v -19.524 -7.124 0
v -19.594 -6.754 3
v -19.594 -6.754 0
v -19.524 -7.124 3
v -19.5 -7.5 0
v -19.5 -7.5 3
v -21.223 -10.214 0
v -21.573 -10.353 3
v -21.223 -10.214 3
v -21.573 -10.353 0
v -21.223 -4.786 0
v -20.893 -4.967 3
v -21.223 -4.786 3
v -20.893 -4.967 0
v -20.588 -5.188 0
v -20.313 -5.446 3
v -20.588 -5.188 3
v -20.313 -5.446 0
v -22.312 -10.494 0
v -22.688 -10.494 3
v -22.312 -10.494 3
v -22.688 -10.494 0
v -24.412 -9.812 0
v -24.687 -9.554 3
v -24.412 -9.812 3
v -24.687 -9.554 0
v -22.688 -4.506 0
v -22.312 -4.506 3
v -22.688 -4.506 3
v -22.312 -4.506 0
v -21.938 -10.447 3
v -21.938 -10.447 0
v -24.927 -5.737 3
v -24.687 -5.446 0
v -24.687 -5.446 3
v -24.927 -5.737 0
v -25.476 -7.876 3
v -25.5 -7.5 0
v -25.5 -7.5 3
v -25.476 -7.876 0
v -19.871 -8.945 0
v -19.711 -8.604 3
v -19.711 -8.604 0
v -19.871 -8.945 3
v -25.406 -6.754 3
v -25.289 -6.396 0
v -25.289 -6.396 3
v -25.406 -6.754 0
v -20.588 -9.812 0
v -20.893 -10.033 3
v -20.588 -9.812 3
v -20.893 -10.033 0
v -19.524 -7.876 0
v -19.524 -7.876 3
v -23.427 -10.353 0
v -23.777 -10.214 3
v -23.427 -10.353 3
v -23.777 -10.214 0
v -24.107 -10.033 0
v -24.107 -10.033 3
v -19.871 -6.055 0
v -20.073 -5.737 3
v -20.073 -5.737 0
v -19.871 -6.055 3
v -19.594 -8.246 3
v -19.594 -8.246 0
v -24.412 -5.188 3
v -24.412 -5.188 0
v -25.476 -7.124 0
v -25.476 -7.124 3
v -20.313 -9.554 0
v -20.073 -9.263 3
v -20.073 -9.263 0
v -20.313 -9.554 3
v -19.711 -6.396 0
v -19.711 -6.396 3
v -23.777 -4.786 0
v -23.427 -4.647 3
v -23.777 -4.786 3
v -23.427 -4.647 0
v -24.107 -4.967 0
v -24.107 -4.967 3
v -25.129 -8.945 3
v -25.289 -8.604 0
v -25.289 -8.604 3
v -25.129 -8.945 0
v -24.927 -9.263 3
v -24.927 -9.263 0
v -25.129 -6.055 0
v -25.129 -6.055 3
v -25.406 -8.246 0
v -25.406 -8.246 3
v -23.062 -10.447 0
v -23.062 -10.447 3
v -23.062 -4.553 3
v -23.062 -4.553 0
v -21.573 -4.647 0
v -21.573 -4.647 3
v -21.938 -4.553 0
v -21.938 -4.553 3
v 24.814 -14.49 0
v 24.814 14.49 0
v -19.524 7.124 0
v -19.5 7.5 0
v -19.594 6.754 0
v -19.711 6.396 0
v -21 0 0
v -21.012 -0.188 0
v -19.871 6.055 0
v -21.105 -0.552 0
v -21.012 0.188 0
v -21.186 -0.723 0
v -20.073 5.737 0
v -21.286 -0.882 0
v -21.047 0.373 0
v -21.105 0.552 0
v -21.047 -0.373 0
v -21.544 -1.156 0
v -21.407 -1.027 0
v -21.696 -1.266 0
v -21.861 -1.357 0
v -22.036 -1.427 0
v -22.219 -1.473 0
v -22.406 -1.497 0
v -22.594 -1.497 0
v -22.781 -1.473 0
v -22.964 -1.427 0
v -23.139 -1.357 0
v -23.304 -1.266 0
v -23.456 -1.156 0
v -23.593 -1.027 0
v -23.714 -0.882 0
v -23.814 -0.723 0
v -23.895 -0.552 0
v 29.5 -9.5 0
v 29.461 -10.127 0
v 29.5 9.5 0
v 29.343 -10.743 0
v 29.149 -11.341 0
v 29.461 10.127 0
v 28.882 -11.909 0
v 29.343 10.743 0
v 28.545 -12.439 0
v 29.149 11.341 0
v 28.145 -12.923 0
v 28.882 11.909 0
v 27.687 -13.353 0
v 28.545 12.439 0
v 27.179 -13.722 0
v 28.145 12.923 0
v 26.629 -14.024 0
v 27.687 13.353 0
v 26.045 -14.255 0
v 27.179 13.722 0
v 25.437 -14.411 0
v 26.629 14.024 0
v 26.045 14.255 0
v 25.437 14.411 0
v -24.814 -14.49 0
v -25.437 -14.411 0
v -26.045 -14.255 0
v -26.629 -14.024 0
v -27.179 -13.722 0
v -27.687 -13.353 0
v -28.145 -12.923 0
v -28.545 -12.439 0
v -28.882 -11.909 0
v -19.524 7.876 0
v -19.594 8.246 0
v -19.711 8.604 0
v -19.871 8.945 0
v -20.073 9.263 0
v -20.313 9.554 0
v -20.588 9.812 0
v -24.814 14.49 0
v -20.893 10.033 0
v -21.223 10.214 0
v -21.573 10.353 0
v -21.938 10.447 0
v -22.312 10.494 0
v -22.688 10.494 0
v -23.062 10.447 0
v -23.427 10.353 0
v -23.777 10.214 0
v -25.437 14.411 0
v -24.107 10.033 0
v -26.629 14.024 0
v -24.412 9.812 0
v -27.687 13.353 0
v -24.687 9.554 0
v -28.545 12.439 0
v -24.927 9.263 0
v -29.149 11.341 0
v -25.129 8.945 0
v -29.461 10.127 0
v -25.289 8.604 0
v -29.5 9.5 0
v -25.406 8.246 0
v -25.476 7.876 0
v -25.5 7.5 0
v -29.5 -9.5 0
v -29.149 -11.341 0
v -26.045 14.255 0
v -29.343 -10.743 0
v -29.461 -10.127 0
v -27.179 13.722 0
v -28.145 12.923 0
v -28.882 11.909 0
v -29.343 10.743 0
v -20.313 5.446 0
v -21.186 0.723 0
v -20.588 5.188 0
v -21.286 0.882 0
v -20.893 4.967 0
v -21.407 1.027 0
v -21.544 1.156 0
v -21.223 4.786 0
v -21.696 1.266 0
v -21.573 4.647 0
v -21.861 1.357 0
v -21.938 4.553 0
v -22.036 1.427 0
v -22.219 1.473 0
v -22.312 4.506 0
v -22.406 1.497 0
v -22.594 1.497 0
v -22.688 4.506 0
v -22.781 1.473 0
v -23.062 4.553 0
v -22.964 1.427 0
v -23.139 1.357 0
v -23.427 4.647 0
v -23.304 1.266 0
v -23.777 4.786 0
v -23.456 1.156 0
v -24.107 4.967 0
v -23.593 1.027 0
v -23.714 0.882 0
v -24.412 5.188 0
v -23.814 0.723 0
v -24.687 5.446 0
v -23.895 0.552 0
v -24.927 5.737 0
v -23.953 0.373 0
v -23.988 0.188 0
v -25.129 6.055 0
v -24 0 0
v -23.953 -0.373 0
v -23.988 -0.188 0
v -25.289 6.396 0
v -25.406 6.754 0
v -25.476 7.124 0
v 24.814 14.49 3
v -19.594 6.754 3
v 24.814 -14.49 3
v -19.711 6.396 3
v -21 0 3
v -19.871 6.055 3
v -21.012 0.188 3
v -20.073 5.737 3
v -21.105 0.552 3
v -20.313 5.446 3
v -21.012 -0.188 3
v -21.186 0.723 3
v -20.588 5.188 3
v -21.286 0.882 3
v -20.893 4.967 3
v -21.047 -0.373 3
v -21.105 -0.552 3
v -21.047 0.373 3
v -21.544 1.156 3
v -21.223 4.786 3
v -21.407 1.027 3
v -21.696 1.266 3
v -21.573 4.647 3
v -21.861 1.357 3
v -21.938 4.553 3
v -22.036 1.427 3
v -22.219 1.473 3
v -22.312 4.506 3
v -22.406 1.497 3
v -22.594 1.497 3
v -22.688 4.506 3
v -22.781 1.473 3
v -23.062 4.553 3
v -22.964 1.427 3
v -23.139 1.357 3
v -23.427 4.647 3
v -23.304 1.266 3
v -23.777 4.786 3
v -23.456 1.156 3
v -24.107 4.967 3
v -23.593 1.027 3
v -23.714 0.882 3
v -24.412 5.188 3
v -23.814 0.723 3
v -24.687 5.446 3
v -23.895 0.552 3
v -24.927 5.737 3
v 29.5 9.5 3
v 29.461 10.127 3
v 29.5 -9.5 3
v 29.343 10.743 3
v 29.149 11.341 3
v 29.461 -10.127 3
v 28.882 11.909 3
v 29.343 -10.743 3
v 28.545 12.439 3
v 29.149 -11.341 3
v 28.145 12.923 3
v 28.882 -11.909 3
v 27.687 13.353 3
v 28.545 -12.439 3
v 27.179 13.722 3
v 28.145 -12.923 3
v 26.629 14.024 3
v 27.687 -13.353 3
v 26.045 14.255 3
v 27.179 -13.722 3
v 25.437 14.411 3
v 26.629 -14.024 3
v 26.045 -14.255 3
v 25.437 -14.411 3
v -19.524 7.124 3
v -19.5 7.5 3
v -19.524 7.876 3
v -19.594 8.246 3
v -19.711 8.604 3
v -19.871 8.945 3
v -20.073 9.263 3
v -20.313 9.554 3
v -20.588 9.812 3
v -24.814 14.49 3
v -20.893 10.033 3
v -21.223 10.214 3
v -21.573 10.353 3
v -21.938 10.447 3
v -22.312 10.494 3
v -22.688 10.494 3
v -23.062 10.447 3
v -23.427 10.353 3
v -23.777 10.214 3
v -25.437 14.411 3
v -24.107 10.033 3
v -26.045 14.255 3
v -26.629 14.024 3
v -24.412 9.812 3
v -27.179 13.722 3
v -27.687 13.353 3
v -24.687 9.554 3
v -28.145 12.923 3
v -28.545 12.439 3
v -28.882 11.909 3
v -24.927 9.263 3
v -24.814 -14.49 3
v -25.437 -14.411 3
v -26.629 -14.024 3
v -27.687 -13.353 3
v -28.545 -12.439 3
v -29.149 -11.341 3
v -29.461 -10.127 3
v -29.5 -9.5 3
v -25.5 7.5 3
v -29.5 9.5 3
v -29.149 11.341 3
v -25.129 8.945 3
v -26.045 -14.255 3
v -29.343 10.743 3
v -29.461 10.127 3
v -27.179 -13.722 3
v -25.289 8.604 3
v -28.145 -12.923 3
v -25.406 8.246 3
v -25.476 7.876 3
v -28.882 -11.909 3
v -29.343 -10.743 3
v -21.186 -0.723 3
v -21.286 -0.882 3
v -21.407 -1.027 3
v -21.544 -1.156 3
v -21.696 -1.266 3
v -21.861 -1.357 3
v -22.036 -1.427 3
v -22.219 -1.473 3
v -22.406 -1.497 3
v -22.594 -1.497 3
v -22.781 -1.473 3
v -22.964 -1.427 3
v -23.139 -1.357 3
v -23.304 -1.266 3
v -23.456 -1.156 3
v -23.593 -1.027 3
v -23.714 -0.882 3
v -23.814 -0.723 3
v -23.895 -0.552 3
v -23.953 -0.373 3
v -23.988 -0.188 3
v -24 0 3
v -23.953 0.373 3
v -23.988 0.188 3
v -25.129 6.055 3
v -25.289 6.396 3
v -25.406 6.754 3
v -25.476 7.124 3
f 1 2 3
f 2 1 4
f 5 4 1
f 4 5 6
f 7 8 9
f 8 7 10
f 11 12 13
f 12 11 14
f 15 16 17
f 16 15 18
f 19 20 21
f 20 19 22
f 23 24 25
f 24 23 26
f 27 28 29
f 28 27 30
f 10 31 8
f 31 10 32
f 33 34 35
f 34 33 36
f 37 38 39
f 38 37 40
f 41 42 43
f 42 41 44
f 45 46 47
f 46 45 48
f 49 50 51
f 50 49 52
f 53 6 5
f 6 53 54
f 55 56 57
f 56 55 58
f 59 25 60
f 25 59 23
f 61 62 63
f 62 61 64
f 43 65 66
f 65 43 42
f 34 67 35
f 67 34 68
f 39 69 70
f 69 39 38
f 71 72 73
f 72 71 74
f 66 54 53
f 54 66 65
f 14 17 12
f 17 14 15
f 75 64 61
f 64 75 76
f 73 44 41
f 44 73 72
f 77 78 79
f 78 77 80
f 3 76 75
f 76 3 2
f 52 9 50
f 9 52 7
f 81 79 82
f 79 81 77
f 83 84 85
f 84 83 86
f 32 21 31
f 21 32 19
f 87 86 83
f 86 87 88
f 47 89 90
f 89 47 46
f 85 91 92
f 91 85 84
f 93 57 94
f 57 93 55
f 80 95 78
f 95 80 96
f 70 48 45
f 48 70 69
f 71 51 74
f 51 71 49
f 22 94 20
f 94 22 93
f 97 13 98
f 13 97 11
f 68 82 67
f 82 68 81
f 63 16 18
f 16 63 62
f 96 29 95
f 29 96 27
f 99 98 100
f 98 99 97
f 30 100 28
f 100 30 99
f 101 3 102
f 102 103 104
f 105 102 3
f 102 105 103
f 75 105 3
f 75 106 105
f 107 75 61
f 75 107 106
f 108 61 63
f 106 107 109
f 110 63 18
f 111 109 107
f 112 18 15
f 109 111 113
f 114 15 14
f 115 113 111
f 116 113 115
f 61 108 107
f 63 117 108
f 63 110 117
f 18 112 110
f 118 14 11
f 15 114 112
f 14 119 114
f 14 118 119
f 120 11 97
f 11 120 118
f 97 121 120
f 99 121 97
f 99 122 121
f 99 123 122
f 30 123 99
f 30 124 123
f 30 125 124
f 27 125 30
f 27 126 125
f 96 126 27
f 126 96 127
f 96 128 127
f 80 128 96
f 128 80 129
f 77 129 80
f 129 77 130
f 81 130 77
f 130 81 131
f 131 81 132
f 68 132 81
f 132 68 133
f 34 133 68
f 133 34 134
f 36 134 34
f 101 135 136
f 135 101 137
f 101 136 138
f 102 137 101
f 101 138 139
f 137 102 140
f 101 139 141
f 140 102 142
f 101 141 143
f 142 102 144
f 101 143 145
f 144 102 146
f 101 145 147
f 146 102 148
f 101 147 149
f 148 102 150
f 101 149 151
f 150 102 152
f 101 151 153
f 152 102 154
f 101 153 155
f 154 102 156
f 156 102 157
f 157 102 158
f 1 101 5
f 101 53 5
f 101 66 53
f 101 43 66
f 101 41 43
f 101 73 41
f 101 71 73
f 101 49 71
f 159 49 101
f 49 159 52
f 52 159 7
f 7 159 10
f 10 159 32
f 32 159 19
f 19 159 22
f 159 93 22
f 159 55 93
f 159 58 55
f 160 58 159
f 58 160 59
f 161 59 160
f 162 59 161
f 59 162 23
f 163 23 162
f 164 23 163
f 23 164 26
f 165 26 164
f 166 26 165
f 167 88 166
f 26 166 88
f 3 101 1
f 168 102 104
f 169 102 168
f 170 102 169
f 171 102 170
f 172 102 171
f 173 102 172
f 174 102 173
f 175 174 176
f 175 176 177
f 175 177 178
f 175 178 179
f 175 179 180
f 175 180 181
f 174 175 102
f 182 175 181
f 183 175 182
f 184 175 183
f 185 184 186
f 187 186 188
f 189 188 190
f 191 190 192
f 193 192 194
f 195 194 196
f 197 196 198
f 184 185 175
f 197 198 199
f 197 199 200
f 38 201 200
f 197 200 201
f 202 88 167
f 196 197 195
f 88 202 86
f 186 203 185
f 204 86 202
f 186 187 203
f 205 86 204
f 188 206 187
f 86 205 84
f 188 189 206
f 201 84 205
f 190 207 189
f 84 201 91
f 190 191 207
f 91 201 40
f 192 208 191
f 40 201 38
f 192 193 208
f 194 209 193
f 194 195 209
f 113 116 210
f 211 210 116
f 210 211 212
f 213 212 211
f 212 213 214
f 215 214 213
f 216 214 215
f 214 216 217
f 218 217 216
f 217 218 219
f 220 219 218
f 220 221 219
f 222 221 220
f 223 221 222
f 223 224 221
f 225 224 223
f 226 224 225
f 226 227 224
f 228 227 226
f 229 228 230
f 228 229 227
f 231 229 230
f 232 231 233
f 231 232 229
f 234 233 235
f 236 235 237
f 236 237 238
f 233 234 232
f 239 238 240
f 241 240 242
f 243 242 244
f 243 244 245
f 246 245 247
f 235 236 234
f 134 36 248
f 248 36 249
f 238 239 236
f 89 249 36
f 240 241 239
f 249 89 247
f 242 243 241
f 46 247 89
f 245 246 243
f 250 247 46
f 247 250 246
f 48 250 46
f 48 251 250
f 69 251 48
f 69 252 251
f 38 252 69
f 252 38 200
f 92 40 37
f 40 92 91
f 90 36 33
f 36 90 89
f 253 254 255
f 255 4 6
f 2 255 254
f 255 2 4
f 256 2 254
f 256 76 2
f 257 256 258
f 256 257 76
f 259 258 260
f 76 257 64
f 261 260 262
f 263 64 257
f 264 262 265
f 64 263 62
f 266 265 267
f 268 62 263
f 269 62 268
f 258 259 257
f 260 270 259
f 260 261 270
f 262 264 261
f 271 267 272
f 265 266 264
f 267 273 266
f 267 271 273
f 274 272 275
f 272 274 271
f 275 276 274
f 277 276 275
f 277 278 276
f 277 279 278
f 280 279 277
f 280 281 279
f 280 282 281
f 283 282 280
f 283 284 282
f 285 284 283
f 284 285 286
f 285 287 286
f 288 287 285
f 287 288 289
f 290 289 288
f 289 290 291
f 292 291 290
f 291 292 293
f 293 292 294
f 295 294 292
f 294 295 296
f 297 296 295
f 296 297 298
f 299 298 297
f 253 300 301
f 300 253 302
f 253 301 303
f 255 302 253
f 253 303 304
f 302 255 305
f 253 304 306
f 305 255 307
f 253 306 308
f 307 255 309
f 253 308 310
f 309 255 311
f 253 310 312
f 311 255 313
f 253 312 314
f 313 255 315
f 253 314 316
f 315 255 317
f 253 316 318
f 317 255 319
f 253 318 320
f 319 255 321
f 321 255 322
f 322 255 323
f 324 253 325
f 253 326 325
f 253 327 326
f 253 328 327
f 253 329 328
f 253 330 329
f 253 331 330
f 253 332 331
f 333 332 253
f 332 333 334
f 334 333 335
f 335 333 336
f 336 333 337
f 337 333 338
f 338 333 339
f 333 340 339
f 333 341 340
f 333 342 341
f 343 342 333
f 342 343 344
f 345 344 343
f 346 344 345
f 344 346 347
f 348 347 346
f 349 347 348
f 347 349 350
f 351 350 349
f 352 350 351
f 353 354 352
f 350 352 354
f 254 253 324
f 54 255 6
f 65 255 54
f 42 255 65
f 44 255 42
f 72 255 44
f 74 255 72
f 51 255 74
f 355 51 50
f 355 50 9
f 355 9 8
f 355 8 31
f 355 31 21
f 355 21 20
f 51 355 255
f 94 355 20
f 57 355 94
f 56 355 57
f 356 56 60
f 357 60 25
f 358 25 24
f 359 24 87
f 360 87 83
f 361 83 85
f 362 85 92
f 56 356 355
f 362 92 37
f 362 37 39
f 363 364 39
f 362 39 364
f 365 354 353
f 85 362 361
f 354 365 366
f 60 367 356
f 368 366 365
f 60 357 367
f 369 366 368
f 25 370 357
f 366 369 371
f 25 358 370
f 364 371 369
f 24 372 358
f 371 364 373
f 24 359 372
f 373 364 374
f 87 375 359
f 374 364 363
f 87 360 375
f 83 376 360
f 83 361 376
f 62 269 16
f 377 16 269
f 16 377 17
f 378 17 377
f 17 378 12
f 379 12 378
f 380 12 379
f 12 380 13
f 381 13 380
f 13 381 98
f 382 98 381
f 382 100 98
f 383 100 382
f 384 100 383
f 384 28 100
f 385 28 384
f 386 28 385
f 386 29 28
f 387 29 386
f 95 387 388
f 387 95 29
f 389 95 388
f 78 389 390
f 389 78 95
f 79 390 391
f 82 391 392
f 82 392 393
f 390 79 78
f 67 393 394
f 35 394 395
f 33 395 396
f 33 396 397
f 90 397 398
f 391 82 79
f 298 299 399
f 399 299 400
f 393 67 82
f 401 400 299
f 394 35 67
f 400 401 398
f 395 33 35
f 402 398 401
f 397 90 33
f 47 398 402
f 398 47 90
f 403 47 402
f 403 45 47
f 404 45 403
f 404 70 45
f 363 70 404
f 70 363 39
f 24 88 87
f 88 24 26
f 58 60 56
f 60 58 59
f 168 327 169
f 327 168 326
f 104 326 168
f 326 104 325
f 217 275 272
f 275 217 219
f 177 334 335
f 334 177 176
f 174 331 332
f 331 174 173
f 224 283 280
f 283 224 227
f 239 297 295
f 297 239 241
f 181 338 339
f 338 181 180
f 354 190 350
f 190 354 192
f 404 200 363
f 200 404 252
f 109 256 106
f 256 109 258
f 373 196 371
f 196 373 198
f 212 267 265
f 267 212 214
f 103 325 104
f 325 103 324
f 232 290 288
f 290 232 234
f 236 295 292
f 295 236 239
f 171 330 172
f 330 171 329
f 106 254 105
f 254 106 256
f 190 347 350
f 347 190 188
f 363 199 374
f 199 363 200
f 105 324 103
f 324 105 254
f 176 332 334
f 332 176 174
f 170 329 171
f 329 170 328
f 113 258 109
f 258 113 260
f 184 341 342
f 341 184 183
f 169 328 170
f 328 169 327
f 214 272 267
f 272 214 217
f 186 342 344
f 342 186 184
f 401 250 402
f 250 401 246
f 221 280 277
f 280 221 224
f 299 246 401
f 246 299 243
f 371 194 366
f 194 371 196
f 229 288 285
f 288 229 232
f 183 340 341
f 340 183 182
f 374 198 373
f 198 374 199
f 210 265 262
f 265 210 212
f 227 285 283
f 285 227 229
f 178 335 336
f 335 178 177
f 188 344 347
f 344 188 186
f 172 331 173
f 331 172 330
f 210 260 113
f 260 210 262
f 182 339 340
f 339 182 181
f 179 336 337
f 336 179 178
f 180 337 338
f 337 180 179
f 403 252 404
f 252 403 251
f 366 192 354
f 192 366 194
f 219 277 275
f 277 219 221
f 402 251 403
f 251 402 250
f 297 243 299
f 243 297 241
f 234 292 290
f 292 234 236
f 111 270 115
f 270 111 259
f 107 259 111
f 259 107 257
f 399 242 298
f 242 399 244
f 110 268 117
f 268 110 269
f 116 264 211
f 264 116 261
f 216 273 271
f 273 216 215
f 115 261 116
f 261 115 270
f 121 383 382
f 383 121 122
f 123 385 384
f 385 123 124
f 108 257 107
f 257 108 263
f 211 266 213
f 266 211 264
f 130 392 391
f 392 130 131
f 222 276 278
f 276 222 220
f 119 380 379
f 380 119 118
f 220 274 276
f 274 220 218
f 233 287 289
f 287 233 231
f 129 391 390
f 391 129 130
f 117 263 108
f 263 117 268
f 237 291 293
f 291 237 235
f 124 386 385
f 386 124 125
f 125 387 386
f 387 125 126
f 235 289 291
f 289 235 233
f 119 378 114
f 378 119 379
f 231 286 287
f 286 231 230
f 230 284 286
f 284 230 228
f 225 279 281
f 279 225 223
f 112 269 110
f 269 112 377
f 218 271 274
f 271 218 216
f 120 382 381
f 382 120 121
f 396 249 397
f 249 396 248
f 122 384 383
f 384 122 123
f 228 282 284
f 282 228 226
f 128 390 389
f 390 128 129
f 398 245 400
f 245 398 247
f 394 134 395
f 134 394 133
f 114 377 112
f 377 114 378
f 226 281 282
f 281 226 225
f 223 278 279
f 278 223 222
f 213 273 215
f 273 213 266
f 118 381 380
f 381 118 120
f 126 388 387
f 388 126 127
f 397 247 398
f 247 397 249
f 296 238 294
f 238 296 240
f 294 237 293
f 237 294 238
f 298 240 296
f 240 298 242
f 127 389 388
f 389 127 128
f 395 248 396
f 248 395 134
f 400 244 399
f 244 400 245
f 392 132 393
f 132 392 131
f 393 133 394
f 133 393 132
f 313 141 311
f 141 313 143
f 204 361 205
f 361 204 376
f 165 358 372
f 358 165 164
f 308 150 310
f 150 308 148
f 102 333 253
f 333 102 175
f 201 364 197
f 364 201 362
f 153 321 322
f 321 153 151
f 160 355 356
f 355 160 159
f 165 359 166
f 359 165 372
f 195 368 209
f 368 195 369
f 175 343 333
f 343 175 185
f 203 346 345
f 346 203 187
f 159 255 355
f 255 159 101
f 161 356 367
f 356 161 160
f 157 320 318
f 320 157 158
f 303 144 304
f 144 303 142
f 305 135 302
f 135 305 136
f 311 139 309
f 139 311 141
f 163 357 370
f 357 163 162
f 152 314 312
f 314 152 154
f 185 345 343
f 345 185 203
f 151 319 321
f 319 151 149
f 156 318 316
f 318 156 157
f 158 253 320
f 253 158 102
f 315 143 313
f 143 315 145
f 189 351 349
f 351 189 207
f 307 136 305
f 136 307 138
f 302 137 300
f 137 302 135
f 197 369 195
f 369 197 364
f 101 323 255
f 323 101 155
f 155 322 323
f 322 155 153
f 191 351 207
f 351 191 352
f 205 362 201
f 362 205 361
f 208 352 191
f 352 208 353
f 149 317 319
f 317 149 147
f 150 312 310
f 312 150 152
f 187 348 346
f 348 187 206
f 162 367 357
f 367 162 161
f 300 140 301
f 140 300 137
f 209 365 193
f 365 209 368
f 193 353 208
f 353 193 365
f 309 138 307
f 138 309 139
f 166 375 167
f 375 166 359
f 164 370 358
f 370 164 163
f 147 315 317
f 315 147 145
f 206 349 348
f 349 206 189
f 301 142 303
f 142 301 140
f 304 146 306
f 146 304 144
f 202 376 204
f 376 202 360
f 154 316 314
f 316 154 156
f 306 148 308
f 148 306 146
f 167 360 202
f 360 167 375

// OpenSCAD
$fn = 50;


difference() {
	union() {
		hull() {
			translate(v = [-24.5000000000, 9.5000000000, 0]) {
				cylinder(h = 3, r = 5);
			}
			translate(v = [24.5000000000, 9.5000000000, 0]) {
				cylinder(h = 3, r = 5);
			}
			translate(v = [-24.5000000000, -9.5000000000, 0]) {
				cylinder(h = 3, r = 5);
			}
			translate(v = [24.5000000000, -9.5000000000, 0]) {
				cylinder(h = 3, r = 5);
			}
		}
	}
	union() {
		translate(v = [-22.5000000000, -7.5000000000, 0]) {
			cylinder(h = 3, r = 3.0000000000);
		}
		translate(v = [-22.5000000000, 7.5000000000, 0]) {
			cylinder(h = 3, r = 3.0000000000);
		}
		translate(v = [-22.5000000000, -7.5000000000, 0]) {
			cylinder(h = 3, r = 1.5000000000);
		}
		translate(v = [-22.5000000000, 0.0000000000, 0]) {
			cylinder(h = 3, r = 1.5000000000);
		}
		translate(v = [-22.5000000000, 7.5000000000, 0]) {
			cylinder(h = 3, r = 1.5000000000);
		}
		translate(v = [-22.5000000000, -7.5000000000, 0]) {
			cylinder(h = 3, r = 1.5000000000);
		}
		translate(v = [-22.5000000000, 0.0000000000, 0]) {
			cylinder(h = 3, r = 1.5000000000);
		}
		translate(v = [-22.5000000000, 7.5000000000, 0]) {
			cylinder(h = 3, r = 1.5000000000);
		}
		translate(v = [-22.5000000000, -7.5000000000, 0]) {
			cylinder(h = 3, r = 1.5000000000);
		}
		translate(v = [-22.5000000000, 0.0000000000, 0]) {
			cylinder(h = 3, r = 1.5000000000);
		}
		translate(v = [-22.5000000000, 7.5000000000, 0]) {
			cylinder(h = 3, r = 1.5000000000);
		}
	}
}
